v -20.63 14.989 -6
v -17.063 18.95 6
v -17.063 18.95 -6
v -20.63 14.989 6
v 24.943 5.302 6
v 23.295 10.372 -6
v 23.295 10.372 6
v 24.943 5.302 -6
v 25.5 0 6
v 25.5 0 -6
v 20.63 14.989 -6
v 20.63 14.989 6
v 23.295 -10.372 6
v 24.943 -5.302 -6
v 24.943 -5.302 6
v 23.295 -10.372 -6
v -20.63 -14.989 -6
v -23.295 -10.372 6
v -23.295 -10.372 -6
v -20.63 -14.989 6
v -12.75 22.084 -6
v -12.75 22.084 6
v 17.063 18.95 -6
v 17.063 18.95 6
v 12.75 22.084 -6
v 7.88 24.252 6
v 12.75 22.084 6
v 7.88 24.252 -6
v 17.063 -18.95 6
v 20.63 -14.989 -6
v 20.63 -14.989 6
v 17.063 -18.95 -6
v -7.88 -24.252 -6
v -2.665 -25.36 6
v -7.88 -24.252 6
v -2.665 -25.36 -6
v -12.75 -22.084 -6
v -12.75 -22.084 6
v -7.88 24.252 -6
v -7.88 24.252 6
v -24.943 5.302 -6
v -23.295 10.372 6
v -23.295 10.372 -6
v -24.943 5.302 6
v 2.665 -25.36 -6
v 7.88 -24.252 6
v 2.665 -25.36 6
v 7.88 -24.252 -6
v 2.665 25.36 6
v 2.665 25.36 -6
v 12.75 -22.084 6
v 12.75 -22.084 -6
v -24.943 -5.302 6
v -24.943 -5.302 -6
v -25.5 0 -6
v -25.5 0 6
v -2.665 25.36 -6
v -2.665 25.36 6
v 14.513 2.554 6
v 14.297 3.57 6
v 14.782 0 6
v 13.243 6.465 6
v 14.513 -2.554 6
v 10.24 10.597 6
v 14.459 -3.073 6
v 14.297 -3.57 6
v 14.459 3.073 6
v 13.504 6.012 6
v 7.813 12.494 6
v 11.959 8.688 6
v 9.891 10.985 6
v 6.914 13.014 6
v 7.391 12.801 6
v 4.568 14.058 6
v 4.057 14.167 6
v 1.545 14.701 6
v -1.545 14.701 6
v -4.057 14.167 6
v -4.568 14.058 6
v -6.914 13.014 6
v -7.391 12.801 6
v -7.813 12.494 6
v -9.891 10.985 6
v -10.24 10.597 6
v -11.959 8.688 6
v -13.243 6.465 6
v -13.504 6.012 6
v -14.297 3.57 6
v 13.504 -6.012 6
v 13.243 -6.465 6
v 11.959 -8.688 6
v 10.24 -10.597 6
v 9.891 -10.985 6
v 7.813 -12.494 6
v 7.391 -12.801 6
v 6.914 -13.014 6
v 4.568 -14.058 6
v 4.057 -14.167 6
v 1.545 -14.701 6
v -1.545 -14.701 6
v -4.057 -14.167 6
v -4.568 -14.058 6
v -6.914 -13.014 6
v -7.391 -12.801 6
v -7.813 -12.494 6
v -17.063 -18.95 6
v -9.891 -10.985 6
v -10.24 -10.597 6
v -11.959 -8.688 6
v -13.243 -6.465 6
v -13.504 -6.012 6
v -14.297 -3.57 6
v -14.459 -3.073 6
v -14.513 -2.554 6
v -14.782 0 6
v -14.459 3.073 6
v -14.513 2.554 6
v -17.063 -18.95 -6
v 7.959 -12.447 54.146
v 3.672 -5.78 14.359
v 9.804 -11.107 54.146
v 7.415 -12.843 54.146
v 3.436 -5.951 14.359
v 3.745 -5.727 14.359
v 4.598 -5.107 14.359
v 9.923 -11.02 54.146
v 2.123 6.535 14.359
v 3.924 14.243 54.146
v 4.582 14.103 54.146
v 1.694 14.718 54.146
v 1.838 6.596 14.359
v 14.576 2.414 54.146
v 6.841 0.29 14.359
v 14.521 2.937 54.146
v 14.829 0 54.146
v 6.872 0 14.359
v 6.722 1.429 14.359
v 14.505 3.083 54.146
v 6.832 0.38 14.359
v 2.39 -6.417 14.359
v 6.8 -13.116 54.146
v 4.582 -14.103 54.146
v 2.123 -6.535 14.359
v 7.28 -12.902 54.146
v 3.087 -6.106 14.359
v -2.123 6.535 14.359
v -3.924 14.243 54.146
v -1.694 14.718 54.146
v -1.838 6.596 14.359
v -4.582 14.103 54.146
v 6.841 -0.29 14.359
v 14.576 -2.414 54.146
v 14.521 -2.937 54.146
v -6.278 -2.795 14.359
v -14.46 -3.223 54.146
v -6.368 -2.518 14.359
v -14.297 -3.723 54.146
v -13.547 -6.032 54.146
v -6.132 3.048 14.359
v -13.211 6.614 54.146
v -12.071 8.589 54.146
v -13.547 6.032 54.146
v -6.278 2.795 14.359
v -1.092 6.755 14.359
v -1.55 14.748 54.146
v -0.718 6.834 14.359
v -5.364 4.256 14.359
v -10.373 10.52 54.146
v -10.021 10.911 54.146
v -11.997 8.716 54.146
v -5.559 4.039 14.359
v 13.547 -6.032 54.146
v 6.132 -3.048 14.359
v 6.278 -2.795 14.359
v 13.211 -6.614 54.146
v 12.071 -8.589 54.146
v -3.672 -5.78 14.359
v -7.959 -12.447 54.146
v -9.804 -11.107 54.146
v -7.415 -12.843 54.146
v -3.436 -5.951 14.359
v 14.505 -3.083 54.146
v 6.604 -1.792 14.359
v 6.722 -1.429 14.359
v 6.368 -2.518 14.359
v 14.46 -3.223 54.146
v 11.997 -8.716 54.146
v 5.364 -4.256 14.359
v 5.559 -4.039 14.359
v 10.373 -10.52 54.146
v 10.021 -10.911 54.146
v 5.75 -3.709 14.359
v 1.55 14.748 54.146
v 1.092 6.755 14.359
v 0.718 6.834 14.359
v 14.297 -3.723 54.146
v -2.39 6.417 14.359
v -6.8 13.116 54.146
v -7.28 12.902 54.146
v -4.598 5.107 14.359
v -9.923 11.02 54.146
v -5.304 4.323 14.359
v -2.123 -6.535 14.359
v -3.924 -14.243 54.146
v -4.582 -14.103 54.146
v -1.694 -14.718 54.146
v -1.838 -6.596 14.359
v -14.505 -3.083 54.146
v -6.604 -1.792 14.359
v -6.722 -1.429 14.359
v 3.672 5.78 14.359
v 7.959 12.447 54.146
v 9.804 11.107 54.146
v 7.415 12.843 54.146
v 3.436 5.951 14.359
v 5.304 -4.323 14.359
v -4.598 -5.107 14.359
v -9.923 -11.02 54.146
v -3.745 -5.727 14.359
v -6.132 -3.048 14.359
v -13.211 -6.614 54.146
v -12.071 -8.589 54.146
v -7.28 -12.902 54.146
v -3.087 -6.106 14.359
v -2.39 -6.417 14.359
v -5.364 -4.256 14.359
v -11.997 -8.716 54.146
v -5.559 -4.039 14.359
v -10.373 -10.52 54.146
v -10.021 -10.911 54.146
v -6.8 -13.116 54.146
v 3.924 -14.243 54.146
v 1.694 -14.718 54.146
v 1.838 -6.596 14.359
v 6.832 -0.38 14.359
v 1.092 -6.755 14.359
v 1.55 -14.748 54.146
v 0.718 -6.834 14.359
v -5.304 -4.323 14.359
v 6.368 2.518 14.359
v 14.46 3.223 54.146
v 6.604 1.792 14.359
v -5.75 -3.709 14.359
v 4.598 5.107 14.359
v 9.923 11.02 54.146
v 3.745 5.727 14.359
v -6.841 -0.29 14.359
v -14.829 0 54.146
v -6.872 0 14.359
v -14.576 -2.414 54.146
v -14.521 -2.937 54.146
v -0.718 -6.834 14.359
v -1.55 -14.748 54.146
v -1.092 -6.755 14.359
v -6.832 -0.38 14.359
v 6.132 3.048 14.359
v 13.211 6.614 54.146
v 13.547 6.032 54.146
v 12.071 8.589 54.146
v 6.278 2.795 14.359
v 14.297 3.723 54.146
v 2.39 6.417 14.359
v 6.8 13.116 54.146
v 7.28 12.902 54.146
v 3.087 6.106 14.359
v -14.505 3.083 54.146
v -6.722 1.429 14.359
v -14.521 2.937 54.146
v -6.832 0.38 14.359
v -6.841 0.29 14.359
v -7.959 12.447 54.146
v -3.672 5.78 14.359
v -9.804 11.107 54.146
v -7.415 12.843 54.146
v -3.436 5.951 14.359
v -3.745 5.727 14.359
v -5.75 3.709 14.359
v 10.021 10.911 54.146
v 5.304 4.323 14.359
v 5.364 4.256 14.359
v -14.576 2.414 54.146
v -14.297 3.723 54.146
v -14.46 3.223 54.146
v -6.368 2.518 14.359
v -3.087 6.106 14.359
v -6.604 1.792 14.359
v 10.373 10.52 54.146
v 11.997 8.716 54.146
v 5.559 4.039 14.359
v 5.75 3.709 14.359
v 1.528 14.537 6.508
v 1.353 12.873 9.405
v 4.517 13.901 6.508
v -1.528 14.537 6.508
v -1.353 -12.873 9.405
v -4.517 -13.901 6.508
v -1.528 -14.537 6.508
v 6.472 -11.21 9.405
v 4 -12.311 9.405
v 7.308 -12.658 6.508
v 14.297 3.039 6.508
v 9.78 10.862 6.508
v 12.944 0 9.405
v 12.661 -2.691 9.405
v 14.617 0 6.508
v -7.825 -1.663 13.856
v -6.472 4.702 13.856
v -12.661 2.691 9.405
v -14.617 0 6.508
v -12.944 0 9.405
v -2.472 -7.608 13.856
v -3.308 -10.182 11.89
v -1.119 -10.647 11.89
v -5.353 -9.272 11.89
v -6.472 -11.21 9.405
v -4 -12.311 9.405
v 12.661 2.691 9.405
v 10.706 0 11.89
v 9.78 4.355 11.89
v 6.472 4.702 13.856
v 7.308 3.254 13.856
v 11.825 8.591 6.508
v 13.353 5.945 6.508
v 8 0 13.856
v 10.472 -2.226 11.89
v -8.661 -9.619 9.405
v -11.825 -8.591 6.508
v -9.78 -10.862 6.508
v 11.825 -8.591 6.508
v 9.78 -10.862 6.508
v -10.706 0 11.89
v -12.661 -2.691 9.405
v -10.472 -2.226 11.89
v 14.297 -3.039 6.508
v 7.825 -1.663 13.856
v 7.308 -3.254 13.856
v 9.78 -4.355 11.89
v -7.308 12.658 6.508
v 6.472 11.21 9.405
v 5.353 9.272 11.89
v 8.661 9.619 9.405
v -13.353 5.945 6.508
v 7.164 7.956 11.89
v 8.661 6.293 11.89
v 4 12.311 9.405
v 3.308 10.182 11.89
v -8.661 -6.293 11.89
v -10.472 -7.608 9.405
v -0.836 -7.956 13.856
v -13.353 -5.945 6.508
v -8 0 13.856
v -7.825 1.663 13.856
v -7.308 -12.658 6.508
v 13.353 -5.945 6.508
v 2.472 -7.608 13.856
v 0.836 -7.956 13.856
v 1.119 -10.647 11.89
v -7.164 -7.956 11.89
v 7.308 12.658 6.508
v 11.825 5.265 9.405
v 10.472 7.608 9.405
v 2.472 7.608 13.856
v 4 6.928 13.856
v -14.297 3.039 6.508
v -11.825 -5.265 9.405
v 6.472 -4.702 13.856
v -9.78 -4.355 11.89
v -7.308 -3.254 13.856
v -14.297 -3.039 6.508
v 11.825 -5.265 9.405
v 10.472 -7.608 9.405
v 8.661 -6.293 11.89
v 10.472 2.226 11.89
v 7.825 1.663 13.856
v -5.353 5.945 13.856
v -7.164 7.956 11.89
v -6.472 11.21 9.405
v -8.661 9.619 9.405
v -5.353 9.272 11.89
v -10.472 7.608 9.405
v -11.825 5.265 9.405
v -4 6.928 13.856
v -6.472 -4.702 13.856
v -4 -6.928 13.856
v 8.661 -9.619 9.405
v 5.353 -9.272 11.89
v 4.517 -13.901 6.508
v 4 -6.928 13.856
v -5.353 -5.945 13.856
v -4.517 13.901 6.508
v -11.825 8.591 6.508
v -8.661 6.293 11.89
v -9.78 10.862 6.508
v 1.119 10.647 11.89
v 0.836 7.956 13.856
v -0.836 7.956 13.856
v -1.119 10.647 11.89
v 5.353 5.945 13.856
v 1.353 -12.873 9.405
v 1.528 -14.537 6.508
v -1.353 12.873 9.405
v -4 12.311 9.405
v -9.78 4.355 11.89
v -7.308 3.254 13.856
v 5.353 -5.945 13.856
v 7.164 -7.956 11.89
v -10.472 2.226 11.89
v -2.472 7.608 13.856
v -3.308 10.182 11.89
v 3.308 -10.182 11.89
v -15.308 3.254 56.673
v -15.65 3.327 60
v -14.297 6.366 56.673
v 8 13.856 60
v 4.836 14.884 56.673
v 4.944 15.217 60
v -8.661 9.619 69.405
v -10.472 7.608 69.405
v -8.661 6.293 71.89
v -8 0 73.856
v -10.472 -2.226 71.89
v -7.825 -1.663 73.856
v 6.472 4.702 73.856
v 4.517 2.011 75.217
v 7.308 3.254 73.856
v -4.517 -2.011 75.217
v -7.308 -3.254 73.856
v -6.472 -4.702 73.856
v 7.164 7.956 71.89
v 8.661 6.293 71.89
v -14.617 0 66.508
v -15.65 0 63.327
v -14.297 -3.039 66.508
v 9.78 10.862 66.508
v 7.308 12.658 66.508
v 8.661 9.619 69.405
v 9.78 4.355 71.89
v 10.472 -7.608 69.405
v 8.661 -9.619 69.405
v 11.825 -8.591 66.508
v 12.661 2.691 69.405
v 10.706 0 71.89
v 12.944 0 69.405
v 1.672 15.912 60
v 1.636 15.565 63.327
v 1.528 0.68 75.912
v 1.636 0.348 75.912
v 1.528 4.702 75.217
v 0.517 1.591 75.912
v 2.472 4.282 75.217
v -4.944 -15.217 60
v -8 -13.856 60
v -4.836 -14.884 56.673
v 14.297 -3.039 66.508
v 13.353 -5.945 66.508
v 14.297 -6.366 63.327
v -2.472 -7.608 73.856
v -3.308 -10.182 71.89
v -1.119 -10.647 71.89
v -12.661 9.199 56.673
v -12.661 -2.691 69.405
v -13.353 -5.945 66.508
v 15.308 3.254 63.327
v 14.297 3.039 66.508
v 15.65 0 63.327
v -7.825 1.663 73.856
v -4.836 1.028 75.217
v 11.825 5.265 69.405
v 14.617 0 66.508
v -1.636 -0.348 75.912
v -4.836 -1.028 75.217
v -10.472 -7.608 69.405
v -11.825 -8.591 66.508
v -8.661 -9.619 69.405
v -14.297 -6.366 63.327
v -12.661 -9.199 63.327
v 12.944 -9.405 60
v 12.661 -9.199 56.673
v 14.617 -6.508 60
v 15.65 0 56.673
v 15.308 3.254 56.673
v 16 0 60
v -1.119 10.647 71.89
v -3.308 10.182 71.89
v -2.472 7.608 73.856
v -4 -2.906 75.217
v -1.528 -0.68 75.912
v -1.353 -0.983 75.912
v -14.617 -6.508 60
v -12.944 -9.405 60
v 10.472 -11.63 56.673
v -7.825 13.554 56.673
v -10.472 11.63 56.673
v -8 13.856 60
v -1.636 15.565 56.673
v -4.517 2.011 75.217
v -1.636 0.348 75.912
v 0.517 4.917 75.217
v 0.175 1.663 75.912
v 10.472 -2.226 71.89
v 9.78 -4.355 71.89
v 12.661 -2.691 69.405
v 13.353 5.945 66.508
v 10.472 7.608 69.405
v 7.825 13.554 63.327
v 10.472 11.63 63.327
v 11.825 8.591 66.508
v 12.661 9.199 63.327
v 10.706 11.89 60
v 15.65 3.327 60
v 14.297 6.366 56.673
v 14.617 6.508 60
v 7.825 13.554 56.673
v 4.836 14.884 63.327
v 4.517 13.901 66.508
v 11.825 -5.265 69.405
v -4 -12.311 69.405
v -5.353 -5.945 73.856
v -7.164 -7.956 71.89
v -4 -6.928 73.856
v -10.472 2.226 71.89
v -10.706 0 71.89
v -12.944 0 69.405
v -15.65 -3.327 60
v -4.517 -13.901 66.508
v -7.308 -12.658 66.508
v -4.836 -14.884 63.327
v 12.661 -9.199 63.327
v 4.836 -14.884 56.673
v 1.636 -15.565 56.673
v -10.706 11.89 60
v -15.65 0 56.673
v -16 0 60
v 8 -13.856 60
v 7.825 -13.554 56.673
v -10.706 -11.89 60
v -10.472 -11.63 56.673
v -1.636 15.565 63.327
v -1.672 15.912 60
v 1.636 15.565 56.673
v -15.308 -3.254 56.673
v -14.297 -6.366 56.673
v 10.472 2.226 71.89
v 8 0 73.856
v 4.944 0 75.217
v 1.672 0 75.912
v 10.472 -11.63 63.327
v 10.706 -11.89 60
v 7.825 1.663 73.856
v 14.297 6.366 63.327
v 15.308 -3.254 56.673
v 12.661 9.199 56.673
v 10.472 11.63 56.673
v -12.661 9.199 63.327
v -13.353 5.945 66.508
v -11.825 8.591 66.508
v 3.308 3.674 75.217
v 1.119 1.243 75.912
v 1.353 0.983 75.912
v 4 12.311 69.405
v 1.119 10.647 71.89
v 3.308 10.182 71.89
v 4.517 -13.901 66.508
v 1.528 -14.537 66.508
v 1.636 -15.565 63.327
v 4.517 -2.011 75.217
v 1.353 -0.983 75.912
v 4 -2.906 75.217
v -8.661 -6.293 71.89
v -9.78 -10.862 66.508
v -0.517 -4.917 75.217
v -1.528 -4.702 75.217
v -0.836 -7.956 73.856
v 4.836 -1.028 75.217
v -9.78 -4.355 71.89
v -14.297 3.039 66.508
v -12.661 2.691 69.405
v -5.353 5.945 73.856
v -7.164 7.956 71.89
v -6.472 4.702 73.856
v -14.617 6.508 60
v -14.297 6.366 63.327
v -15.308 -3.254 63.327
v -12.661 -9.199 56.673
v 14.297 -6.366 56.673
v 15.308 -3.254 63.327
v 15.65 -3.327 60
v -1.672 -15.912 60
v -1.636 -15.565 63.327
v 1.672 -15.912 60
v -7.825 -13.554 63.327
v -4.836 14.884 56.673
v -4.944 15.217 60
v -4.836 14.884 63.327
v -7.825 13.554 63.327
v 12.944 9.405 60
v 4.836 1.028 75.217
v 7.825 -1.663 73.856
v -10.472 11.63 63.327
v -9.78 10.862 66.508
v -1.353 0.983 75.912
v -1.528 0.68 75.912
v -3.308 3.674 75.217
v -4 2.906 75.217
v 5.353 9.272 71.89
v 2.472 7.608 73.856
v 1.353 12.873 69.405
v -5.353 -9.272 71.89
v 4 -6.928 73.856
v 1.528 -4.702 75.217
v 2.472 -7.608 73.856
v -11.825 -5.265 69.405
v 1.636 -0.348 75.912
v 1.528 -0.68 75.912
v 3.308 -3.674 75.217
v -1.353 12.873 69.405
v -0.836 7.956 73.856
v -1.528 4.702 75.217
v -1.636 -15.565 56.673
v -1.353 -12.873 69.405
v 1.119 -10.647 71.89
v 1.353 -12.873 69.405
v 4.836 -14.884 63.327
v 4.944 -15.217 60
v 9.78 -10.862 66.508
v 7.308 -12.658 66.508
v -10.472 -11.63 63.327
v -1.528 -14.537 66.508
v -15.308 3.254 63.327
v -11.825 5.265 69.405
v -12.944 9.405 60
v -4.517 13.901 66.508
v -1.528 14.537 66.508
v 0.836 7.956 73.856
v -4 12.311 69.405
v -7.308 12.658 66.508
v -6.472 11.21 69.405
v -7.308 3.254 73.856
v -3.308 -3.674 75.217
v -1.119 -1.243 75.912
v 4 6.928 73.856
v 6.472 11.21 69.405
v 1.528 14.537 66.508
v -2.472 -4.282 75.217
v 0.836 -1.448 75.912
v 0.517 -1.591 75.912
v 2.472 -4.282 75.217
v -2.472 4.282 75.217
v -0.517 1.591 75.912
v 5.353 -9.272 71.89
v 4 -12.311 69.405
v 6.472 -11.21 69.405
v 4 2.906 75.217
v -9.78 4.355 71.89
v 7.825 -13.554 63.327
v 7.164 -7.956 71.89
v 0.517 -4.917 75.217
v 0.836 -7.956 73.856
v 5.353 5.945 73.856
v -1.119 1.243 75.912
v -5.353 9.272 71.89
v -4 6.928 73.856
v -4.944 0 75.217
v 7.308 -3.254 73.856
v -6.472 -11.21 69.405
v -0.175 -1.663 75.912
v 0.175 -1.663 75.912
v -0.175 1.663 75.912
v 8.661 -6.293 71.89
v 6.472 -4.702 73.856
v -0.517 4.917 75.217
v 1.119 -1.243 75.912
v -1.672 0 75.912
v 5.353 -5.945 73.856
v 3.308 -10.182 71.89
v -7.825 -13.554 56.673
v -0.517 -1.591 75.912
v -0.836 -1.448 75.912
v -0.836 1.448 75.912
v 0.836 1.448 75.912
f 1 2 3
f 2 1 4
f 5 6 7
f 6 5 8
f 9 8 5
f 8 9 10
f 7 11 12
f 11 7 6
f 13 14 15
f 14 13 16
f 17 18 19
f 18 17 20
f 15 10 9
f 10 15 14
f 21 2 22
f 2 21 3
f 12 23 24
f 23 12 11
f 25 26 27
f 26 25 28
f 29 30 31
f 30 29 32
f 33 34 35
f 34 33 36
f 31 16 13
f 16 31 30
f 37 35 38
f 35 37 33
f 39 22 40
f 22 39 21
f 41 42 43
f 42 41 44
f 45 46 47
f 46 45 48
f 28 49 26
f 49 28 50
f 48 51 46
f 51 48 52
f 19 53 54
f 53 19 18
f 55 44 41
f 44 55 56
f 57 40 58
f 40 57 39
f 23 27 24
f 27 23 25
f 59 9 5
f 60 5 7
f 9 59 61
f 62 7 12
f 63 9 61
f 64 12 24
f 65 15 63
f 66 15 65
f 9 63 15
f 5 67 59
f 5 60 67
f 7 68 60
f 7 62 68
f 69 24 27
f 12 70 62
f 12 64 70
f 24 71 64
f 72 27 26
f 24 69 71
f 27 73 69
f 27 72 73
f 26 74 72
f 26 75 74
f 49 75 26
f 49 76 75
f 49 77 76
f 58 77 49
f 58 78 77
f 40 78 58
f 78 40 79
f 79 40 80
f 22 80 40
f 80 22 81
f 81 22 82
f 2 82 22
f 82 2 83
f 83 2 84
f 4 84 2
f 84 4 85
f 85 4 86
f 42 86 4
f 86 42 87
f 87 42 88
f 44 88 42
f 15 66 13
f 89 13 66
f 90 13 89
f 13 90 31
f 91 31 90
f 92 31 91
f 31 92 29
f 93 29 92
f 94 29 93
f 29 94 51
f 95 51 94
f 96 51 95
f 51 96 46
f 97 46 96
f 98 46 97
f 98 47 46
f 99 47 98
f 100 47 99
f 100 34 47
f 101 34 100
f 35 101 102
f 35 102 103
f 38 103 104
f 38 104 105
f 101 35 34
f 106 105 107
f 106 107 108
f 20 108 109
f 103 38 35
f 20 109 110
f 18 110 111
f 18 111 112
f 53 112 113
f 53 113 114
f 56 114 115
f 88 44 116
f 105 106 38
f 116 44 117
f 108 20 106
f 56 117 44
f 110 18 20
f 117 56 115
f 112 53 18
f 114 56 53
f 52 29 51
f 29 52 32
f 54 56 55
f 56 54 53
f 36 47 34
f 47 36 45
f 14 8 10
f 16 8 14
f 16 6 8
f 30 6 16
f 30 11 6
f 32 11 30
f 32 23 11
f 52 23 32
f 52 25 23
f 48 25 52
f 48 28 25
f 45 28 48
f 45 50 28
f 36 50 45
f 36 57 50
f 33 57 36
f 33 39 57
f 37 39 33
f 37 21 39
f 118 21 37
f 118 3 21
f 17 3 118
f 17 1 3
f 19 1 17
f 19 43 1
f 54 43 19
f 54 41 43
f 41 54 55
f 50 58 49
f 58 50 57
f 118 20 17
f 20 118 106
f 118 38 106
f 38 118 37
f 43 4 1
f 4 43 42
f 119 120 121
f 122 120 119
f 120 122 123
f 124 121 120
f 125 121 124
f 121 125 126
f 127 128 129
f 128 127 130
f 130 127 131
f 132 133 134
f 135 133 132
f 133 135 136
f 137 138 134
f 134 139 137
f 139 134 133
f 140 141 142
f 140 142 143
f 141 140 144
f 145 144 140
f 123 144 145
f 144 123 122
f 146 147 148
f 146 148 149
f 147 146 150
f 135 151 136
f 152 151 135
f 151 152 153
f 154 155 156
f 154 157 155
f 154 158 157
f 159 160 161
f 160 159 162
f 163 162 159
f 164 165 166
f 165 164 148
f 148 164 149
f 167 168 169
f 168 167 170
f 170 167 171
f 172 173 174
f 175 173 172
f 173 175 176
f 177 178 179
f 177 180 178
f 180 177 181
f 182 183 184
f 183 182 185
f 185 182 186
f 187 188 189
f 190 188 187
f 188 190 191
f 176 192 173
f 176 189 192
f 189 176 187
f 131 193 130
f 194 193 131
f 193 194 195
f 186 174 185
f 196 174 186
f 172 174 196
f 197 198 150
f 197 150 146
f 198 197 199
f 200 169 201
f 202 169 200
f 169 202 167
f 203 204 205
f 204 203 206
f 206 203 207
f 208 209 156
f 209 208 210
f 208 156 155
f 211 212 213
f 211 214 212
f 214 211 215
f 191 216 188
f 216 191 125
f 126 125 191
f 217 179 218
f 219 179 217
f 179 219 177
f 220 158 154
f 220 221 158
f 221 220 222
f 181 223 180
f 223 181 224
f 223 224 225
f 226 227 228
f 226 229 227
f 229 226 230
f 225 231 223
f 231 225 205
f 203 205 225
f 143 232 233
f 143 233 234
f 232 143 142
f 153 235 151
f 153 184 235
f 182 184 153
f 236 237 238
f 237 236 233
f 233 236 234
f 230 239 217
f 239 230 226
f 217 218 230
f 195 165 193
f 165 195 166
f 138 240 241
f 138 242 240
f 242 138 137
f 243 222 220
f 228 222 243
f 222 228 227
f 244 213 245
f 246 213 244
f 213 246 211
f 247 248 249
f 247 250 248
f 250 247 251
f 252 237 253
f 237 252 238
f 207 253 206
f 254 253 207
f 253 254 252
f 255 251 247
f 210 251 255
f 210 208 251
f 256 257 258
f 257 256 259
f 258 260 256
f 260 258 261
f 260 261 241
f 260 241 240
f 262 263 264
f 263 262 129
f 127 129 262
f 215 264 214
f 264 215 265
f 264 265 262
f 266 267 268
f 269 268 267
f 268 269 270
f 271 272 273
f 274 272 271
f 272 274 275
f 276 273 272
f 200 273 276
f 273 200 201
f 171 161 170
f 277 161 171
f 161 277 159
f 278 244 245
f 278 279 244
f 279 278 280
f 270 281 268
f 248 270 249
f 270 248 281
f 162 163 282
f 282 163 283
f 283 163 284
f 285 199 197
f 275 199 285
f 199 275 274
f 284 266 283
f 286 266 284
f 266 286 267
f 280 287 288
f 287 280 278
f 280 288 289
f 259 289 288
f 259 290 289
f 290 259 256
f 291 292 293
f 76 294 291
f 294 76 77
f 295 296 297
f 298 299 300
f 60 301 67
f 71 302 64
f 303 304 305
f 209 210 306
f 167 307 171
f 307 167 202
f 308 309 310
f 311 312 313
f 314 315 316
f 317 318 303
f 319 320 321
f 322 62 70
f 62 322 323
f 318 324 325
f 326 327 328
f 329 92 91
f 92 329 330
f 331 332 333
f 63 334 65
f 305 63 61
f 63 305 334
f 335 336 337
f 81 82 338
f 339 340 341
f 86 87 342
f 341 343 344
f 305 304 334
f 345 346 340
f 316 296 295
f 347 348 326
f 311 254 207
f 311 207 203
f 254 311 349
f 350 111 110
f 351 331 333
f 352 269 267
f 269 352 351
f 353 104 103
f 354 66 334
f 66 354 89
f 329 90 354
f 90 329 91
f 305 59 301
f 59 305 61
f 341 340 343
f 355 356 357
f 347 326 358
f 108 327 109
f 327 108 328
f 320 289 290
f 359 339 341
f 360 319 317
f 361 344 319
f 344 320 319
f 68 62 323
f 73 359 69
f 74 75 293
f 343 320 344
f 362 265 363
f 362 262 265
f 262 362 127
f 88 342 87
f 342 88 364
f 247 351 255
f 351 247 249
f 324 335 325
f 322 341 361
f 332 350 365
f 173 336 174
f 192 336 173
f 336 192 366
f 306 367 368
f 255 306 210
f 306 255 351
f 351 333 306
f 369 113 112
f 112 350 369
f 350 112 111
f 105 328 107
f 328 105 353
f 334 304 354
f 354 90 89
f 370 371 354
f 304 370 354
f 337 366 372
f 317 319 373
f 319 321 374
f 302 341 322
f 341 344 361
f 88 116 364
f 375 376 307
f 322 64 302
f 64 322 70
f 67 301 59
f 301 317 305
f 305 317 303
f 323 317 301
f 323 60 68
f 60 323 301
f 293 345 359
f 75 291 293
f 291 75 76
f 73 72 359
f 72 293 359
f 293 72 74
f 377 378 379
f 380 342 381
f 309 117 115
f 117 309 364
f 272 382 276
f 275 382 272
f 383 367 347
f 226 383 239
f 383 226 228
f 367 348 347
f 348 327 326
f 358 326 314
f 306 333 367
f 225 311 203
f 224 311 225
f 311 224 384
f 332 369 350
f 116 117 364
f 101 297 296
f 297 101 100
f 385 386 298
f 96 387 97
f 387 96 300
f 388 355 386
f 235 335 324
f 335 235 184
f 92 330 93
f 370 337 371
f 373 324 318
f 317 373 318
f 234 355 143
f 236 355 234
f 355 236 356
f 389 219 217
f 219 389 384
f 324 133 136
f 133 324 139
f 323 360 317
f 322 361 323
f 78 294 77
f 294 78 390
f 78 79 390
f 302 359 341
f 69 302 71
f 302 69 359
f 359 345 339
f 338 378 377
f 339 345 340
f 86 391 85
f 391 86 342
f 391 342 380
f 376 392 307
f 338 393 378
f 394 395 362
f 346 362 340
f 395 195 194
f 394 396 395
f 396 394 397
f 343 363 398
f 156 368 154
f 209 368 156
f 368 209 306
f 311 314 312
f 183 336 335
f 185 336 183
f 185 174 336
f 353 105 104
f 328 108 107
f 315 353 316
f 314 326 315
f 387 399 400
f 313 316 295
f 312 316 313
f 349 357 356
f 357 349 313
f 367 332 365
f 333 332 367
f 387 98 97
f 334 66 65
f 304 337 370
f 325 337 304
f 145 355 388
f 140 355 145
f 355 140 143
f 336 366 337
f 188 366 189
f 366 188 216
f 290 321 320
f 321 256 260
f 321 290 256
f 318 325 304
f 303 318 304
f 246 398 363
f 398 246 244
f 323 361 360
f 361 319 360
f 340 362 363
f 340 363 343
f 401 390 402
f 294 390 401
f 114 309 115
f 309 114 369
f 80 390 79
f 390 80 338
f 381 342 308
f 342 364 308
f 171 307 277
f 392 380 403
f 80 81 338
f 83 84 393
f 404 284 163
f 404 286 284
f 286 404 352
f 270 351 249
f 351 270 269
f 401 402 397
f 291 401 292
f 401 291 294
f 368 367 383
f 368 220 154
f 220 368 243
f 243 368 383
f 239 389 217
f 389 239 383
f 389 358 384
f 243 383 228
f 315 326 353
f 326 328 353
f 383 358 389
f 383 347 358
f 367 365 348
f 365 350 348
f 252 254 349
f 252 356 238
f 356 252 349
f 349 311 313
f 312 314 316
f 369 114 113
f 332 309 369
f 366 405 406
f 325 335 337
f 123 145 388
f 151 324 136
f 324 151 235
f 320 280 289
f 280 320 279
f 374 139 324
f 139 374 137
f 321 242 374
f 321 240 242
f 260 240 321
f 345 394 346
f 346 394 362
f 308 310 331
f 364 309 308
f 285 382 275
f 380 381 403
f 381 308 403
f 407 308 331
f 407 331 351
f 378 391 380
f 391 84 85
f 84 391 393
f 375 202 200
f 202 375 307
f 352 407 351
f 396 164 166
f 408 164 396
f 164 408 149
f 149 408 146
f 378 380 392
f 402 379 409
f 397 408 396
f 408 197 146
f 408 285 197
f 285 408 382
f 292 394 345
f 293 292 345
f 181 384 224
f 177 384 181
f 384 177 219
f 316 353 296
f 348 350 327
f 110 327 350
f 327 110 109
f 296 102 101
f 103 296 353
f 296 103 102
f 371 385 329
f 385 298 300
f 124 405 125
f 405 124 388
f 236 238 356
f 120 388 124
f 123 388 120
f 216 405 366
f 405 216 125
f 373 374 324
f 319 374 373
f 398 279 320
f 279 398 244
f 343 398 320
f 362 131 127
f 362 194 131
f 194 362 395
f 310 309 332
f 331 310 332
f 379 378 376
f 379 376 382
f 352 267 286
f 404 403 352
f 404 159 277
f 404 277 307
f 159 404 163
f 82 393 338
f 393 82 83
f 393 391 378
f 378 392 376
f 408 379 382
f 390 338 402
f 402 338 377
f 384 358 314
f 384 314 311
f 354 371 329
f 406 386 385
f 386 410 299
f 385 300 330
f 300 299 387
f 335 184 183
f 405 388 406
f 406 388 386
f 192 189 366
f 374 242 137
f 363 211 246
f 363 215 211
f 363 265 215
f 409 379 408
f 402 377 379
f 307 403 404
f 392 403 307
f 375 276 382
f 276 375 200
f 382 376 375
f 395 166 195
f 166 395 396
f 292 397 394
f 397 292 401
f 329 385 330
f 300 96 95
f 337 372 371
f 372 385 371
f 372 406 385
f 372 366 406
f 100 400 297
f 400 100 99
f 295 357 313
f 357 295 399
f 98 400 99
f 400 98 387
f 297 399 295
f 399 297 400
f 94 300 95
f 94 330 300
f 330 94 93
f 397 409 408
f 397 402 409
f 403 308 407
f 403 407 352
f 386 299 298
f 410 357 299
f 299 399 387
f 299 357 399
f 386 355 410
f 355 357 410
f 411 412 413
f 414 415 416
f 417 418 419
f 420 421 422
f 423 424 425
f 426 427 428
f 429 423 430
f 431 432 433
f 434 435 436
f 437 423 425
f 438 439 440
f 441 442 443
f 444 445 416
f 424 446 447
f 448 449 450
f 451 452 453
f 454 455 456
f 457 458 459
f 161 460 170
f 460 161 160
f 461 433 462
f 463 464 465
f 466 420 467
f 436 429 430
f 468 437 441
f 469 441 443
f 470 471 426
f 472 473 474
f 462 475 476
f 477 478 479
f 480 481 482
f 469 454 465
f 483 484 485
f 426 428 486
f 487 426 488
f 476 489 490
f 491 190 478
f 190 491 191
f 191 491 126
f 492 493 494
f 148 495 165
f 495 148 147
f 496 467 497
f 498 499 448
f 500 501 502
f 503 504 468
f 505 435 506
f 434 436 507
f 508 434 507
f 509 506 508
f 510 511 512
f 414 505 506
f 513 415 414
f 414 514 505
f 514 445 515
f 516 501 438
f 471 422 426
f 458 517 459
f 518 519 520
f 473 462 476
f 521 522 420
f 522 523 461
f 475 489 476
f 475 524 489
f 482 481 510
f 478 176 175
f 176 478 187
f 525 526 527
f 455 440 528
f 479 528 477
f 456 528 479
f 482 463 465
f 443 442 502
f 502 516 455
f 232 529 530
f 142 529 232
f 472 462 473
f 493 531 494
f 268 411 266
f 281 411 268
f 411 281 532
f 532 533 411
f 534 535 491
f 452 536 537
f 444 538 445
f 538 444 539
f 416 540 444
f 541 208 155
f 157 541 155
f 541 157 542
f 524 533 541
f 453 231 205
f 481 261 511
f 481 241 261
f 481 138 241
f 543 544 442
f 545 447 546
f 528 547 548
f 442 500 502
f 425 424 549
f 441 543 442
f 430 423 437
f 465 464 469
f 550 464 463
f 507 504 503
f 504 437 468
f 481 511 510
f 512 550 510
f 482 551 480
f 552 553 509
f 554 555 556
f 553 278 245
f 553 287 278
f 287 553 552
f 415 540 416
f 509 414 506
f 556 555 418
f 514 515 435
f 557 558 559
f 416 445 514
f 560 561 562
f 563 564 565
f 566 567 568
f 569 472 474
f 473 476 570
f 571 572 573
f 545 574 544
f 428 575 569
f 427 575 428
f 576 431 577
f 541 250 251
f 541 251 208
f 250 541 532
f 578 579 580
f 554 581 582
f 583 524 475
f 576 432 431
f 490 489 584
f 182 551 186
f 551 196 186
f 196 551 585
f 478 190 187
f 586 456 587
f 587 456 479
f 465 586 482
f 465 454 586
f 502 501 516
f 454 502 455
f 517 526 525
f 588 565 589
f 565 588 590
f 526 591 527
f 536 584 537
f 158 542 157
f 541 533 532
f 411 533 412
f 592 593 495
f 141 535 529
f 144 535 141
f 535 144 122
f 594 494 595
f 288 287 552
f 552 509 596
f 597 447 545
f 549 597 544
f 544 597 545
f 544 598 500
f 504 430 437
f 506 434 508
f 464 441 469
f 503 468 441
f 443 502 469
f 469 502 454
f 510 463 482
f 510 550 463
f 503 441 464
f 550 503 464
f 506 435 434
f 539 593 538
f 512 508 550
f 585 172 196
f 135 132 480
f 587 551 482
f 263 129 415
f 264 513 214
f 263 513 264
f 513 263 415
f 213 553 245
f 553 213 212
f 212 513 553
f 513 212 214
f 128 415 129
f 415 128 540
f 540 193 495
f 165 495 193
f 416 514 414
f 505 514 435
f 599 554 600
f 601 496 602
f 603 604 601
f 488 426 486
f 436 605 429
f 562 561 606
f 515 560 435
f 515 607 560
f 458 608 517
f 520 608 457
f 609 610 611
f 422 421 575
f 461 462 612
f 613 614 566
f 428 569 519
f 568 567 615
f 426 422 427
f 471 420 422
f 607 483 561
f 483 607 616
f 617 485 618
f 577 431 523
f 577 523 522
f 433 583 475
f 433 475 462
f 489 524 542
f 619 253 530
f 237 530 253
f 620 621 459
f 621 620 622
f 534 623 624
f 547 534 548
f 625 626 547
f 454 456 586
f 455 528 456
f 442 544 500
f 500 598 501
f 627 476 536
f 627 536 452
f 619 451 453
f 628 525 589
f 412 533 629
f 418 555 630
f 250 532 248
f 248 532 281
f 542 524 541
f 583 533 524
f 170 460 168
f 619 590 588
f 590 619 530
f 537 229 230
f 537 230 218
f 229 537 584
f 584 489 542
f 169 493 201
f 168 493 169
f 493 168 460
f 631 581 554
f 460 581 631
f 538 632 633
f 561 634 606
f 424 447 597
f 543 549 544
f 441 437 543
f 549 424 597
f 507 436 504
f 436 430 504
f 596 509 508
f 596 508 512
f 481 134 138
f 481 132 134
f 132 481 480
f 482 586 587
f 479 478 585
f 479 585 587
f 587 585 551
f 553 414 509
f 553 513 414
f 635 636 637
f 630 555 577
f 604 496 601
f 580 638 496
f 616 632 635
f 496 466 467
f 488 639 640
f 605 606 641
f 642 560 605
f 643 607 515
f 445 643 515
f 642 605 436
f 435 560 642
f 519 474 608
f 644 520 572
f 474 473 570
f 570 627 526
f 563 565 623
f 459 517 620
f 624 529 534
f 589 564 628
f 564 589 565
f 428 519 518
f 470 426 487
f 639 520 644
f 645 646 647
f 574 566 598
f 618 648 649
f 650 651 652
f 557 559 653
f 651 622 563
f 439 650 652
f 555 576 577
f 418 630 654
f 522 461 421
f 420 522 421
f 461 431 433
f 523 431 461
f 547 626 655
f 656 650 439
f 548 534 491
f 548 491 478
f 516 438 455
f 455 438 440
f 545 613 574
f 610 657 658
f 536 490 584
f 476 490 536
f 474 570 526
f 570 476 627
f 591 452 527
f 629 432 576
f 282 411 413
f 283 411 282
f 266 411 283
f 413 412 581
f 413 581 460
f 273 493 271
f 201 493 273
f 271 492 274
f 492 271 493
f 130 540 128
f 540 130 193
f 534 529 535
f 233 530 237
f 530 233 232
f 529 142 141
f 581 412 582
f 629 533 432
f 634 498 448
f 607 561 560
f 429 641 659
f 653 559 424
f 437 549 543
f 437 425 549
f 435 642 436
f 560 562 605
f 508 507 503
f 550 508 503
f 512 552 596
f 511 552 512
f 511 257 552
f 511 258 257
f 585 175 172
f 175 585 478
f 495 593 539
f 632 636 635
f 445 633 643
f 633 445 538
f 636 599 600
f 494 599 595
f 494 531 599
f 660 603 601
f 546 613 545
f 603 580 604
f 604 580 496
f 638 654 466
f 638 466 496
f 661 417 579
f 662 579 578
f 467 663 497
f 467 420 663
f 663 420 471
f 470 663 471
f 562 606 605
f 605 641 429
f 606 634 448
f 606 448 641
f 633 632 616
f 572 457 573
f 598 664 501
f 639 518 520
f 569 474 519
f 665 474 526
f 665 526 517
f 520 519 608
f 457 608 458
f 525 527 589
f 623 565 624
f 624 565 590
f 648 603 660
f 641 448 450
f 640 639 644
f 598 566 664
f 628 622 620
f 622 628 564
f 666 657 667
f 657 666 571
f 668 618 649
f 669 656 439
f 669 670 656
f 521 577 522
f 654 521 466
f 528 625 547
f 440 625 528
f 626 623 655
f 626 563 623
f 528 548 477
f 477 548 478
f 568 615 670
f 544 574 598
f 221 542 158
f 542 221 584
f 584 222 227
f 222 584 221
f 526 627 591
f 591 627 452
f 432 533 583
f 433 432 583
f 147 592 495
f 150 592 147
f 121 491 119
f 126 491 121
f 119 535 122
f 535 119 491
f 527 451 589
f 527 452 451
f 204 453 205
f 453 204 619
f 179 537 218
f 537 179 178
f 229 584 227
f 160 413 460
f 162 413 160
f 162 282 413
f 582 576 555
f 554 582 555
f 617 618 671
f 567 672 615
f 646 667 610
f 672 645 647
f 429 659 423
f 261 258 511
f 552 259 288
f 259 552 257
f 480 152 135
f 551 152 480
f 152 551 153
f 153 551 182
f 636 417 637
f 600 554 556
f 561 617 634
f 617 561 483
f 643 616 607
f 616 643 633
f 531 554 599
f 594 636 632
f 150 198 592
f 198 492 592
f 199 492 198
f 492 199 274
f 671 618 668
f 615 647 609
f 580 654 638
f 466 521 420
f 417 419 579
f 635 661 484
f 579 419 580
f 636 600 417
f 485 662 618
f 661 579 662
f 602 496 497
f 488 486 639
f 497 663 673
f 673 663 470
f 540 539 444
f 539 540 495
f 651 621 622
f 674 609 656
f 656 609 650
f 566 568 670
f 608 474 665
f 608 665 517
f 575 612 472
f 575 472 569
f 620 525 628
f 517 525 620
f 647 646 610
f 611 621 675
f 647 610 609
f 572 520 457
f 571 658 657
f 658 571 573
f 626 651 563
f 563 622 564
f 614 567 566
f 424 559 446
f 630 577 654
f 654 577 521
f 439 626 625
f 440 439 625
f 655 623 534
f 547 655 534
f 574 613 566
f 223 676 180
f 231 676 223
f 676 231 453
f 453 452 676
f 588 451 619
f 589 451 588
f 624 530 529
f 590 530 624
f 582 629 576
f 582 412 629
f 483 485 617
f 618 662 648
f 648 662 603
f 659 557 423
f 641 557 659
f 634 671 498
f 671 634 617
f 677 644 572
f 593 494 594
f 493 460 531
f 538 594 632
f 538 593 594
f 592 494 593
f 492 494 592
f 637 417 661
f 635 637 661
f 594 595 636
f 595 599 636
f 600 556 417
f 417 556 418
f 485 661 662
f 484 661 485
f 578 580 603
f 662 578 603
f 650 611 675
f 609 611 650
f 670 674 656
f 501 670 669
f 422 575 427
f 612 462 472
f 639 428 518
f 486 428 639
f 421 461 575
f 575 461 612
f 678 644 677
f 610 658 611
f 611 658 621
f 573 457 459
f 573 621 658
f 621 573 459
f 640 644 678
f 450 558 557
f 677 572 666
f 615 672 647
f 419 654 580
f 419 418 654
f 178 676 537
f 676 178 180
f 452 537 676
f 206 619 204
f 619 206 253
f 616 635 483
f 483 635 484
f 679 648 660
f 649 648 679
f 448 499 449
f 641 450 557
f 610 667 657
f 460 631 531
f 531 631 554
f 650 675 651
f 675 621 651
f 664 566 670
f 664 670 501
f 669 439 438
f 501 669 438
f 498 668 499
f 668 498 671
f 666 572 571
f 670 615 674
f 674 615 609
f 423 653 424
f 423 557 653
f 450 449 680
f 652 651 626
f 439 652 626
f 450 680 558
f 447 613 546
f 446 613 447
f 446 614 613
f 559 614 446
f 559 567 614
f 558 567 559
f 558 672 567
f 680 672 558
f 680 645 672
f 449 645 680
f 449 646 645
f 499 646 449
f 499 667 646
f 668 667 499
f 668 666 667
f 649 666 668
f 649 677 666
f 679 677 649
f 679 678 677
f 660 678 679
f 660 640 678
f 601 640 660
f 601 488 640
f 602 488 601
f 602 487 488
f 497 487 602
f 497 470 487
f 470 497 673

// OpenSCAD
difference(){
union(){cylinder(h=12,r1=25.5,r2=25.5,center=true);
translate([0,0,35])cylinder(h=50,r1=6,r2=16,center=true);
sphere(16);
translate([0,0,60])sphere(16);
}
translate([0,0,-12])cylinder(h=12,r1=25.5,r2=25.5,center=true);
}
